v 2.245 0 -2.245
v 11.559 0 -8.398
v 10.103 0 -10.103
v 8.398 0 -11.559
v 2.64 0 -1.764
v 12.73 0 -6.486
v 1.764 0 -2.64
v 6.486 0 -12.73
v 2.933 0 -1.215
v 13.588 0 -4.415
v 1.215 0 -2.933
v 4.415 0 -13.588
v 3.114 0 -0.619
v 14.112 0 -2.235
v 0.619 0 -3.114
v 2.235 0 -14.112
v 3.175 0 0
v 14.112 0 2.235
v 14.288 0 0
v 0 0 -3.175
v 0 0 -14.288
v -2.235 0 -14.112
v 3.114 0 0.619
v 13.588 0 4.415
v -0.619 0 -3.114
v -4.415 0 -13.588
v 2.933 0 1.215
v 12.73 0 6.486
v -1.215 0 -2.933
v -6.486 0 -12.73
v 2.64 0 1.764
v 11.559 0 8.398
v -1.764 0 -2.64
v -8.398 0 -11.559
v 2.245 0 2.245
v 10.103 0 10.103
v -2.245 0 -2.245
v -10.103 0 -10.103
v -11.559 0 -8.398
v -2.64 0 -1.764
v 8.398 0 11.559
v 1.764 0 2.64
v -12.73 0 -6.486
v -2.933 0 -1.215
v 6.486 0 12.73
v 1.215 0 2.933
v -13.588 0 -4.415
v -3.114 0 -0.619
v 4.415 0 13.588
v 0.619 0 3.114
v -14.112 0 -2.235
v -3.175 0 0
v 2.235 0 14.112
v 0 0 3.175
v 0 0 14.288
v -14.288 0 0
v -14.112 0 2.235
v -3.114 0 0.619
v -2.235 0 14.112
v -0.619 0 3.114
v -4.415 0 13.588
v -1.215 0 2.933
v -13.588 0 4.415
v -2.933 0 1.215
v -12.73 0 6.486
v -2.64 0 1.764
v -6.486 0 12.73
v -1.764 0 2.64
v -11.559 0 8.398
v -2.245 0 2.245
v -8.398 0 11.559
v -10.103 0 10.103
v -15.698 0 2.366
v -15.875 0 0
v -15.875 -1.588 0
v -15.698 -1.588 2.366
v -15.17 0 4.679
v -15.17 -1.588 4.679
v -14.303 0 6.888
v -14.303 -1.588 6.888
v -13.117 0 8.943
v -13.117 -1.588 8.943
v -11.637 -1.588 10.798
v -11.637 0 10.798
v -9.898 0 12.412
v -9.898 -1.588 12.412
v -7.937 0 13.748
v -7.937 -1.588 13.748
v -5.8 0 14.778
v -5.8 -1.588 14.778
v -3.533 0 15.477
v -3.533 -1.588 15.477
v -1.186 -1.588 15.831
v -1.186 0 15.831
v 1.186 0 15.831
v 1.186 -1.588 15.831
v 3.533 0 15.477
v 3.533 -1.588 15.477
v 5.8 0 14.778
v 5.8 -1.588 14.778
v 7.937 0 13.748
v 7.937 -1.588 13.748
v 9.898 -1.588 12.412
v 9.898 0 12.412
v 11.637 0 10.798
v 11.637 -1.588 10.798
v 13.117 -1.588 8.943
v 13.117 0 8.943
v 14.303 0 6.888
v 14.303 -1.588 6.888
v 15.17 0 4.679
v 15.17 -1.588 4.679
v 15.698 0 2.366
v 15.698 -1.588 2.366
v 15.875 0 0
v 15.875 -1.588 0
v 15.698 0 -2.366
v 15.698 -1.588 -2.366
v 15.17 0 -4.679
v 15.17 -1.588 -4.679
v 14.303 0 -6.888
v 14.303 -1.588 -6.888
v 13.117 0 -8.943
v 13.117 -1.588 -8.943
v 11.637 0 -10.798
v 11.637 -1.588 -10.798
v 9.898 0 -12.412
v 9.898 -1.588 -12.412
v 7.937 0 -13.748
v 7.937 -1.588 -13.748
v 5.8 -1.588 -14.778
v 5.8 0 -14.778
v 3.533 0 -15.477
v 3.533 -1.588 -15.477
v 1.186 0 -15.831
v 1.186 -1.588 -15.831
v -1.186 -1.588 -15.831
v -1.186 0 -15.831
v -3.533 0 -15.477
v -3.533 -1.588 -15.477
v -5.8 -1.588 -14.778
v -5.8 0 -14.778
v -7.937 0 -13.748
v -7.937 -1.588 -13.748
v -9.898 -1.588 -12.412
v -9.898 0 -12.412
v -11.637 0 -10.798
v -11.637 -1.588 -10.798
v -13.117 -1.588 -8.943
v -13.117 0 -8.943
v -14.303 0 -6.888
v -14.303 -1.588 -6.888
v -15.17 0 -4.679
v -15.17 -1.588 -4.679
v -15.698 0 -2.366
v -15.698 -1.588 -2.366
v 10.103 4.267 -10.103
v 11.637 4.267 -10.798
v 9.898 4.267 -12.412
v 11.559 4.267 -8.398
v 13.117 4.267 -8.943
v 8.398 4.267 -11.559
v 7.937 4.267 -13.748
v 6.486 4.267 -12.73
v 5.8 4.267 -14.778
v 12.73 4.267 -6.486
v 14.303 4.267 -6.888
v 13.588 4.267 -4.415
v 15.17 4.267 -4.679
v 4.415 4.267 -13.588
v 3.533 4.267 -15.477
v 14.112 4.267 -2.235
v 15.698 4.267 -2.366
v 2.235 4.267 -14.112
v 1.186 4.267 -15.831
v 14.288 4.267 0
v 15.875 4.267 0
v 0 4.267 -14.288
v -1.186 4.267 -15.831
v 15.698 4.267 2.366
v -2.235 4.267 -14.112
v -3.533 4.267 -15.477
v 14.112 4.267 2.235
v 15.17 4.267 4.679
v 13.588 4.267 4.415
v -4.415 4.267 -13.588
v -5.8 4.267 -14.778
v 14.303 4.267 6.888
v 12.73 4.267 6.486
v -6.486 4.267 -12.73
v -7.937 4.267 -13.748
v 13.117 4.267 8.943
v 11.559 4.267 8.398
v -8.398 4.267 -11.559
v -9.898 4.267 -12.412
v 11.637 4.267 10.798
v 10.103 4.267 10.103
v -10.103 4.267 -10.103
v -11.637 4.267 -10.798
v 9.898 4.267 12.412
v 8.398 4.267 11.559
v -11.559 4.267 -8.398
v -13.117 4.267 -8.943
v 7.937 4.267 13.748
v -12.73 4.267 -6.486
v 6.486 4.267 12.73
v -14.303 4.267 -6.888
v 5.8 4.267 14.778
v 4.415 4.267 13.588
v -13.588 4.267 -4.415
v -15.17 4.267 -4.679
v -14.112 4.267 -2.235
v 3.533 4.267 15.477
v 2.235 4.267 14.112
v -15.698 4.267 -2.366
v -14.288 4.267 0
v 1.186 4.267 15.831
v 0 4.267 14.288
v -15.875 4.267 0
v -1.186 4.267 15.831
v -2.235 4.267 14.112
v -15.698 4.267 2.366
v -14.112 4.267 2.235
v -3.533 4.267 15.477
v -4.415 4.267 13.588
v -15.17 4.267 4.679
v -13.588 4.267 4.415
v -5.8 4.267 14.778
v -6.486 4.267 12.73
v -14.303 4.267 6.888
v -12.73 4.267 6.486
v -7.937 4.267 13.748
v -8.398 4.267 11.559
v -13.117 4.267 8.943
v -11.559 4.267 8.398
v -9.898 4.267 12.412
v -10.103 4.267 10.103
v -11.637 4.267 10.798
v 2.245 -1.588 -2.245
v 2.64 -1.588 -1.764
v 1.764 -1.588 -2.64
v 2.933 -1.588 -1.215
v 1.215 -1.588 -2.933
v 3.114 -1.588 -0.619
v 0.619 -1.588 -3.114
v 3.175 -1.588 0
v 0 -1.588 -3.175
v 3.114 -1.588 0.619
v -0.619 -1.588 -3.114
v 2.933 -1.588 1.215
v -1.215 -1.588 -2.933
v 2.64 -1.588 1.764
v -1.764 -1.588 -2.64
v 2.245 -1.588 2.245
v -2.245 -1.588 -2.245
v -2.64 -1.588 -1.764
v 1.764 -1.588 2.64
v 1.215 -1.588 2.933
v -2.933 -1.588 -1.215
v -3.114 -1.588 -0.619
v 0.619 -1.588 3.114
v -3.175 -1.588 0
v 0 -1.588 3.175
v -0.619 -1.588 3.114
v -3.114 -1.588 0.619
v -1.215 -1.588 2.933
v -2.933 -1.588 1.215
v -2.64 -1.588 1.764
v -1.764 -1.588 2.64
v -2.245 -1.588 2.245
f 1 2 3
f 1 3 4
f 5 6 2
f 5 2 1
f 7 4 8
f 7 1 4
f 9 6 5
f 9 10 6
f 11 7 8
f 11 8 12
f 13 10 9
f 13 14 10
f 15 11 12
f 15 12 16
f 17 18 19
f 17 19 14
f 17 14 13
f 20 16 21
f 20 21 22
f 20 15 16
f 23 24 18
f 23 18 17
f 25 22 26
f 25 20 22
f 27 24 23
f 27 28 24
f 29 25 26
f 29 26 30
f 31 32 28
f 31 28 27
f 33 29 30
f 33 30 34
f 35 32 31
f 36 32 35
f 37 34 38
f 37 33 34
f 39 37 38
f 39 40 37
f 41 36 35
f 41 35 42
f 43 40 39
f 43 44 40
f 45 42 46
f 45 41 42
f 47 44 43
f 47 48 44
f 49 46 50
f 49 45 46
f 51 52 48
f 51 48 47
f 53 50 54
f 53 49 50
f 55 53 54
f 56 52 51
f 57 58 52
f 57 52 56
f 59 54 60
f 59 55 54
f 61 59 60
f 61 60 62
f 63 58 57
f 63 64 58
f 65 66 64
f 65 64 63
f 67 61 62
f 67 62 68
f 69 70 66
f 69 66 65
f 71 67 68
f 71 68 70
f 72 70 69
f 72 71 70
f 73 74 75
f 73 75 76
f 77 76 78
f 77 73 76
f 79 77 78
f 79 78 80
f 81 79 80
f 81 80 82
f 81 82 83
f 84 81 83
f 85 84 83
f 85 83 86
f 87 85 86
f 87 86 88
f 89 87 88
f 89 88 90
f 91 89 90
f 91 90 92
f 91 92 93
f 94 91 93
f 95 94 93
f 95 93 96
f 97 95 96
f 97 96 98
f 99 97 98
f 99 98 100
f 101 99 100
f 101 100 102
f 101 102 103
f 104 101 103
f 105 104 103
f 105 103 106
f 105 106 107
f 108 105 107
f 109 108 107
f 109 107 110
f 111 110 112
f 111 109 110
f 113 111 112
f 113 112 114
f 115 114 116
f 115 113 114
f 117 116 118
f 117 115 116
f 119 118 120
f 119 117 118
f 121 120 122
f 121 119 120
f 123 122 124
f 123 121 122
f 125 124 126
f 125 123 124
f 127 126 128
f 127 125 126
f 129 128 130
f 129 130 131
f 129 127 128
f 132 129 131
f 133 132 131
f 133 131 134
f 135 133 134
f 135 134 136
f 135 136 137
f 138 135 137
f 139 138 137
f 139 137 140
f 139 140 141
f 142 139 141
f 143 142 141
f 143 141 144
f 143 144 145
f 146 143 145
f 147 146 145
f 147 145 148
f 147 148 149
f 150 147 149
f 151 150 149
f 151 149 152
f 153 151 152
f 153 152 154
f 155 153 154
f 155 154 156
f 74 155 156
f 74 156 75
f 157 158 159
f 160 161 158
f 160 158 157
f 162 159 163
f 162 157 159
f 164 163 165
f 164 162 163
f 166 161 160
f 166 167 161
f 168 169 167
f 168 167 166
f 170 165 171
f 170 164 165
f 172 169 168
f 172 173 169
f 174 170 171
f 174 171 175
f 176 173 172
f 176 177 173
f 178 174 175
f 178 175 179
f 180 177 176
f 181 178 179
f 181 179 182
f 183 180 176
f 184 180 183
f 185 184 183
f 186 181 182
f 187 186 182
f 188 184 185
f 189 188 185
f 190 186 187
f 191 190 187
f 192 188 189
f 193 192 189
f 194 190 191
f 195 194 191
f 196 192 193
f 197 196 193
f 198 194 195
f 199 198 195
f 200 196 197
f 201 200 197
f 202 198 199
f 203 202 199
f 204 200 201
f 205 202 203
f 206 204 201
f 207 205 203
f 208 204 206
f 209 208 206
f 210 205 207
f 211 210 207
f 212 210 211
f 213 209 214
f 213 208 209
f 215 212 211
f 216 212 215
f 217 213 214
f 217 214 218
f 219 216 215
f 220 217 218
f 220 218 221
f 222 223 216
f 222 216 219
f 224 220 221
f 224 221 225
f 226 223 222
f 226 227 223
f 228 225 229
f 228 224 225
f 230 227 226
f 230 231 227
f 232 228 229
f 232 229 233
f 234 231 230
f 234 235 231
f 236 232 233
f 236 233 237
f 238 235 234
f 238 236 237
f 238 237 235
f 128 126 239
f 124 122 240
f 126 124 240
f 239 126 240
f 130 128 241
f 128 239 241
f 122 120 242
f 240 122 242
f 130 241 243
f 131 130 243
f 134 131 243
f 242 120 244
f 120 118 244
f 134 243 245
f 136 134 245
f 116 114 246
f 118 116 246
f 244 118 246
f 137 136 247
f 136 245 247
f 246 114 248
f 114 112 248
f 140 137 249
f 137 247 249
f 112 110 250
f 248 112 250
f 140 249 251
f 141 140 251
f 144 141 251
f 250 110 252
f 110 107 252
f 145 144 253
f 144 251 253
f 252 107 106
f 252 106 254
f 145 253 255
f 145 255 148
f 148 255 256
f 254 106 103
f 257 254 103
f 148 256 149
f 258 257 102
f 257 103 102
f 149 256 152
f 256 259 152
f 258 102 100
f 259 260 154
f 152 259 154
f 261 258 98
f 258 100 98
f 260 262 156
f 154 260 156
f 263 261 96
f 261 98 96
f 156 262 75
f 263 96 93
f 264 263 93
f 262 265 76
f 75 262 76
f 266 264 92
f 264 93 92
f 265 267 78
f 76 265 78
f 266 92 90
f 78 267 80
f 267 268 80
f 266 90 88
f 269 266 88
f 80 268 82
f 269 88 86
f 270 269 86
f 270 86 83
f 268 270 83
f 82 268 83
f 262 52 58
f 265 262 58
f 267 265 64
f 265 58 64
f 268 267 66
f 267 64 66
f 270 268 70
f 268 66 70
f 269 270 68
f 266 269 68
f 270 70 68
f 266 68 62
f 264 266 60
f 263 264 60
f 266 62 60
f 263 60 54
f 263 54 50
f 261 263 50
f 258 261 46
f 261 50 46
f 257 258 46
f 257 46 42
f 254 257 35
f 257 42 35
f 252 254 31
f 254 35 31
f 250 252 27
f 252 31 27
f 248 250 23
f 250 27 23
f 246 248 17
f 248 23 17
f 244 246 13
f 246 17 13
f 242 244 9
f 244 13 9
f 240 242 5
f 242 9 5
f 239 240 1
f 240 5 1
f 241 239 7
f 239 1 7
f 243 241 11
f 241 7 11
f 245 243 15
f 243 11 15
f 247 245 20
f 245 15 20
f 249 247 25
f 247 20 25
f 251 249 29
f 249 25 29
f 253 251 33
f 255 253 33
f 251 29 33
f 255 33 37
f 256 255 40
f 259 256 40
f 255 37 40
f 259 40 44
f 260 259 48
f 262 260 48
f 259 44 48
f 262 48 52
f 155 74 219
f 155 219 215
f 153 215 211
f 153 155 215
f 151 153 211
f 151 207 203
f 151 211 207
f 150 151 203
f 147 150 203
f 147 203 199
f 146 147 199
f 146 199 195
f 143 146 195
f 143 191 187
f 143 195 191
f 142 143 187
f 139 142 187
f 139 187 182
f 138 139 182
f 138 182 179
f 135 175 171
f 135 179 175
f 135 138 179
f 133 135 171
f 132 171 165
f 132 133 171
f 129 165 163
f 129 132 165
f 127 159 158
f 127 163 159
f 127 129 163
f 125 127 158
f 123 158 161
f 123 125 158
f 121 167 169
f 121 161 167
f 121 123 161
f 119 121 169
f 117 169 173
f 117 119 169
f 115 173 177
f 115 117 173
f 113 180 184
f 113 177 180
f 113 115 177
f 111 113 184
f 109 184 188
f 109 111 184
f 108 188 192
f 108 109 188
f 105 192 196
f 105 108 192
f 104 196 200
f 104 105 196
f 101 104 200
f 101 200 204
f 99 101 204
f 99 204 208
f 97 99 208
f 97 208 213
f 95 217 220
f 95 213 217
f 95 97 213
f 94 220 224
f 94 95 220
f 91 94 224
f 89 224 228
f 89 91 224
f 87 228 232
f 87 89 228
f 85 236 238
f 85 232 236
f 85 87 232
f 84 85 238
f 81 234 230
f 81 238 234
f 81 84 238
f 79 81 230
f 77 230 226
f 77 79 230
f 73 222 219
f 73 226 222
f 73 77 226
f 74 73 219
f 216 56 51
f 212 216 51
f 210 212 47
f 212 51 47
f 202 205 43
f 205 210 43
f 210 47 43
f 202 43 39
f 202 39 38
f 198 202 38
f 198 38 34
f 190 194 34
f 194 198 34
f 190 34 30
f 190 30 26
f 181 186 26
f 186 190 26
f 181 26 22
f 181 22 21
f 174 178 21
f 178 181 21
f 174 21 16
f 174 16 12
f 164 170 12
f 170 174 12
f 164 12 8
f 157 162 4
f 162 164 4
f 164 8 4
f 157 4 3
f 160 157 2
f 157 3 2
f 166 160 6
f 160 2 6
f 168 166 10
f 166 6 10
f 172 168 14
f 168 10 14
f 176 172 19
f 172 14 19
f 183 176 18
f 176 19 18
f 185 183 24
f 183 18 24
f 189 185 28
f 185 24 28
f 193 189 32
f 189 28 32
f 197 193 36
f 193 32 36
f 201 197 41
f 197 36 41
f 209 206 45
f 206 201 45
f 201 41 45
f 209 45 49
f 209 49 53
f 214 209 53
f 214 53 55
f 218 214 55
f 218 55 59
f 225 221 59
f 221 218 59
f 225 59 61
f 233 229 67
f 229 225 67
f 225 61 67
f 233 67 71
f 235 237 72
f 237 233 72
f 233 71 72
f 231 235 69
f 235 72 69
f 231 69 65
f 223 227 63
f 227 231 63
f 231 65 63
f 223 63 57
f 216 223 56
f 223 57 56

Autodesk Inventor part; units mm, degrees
ref_plane "YZ Plane" through (0, 0, 0) normal (1, 0, 0) x (0, 1, 0)
ref_plane "XZ Plane" through (0, 0, 0) normal (0, 1, 0) x (-1, 0, 0)
ref_plane "XY Plane" through (0, 0, 0) normal (0, 0, 1) x (1, 0, 0)
sketch "Sketch1" plane through (0, 0, 0) normal (0, 1, 0) x (-1, 0, 0)
  circle A0 centre (0, 0) radius 3.175
  circle A1 centre (0, 0) radius 14.2875
  circle A2 centre (0, 0) radius 15.875
  dimension "d1" = 6.35
  dimension "d7" = 28.575
  dimension "d8" = 1.5875
extrude "Extrusion1" add sketch "Sketch1" along normal blind 4.2672 contours A2
extrude "Extrusion2" add sketch "Sketch1" against normal blind 1.5875 contours A1 | A2
properties part number "FlipperDriveShaftCap" material "Nylon 6/6"
